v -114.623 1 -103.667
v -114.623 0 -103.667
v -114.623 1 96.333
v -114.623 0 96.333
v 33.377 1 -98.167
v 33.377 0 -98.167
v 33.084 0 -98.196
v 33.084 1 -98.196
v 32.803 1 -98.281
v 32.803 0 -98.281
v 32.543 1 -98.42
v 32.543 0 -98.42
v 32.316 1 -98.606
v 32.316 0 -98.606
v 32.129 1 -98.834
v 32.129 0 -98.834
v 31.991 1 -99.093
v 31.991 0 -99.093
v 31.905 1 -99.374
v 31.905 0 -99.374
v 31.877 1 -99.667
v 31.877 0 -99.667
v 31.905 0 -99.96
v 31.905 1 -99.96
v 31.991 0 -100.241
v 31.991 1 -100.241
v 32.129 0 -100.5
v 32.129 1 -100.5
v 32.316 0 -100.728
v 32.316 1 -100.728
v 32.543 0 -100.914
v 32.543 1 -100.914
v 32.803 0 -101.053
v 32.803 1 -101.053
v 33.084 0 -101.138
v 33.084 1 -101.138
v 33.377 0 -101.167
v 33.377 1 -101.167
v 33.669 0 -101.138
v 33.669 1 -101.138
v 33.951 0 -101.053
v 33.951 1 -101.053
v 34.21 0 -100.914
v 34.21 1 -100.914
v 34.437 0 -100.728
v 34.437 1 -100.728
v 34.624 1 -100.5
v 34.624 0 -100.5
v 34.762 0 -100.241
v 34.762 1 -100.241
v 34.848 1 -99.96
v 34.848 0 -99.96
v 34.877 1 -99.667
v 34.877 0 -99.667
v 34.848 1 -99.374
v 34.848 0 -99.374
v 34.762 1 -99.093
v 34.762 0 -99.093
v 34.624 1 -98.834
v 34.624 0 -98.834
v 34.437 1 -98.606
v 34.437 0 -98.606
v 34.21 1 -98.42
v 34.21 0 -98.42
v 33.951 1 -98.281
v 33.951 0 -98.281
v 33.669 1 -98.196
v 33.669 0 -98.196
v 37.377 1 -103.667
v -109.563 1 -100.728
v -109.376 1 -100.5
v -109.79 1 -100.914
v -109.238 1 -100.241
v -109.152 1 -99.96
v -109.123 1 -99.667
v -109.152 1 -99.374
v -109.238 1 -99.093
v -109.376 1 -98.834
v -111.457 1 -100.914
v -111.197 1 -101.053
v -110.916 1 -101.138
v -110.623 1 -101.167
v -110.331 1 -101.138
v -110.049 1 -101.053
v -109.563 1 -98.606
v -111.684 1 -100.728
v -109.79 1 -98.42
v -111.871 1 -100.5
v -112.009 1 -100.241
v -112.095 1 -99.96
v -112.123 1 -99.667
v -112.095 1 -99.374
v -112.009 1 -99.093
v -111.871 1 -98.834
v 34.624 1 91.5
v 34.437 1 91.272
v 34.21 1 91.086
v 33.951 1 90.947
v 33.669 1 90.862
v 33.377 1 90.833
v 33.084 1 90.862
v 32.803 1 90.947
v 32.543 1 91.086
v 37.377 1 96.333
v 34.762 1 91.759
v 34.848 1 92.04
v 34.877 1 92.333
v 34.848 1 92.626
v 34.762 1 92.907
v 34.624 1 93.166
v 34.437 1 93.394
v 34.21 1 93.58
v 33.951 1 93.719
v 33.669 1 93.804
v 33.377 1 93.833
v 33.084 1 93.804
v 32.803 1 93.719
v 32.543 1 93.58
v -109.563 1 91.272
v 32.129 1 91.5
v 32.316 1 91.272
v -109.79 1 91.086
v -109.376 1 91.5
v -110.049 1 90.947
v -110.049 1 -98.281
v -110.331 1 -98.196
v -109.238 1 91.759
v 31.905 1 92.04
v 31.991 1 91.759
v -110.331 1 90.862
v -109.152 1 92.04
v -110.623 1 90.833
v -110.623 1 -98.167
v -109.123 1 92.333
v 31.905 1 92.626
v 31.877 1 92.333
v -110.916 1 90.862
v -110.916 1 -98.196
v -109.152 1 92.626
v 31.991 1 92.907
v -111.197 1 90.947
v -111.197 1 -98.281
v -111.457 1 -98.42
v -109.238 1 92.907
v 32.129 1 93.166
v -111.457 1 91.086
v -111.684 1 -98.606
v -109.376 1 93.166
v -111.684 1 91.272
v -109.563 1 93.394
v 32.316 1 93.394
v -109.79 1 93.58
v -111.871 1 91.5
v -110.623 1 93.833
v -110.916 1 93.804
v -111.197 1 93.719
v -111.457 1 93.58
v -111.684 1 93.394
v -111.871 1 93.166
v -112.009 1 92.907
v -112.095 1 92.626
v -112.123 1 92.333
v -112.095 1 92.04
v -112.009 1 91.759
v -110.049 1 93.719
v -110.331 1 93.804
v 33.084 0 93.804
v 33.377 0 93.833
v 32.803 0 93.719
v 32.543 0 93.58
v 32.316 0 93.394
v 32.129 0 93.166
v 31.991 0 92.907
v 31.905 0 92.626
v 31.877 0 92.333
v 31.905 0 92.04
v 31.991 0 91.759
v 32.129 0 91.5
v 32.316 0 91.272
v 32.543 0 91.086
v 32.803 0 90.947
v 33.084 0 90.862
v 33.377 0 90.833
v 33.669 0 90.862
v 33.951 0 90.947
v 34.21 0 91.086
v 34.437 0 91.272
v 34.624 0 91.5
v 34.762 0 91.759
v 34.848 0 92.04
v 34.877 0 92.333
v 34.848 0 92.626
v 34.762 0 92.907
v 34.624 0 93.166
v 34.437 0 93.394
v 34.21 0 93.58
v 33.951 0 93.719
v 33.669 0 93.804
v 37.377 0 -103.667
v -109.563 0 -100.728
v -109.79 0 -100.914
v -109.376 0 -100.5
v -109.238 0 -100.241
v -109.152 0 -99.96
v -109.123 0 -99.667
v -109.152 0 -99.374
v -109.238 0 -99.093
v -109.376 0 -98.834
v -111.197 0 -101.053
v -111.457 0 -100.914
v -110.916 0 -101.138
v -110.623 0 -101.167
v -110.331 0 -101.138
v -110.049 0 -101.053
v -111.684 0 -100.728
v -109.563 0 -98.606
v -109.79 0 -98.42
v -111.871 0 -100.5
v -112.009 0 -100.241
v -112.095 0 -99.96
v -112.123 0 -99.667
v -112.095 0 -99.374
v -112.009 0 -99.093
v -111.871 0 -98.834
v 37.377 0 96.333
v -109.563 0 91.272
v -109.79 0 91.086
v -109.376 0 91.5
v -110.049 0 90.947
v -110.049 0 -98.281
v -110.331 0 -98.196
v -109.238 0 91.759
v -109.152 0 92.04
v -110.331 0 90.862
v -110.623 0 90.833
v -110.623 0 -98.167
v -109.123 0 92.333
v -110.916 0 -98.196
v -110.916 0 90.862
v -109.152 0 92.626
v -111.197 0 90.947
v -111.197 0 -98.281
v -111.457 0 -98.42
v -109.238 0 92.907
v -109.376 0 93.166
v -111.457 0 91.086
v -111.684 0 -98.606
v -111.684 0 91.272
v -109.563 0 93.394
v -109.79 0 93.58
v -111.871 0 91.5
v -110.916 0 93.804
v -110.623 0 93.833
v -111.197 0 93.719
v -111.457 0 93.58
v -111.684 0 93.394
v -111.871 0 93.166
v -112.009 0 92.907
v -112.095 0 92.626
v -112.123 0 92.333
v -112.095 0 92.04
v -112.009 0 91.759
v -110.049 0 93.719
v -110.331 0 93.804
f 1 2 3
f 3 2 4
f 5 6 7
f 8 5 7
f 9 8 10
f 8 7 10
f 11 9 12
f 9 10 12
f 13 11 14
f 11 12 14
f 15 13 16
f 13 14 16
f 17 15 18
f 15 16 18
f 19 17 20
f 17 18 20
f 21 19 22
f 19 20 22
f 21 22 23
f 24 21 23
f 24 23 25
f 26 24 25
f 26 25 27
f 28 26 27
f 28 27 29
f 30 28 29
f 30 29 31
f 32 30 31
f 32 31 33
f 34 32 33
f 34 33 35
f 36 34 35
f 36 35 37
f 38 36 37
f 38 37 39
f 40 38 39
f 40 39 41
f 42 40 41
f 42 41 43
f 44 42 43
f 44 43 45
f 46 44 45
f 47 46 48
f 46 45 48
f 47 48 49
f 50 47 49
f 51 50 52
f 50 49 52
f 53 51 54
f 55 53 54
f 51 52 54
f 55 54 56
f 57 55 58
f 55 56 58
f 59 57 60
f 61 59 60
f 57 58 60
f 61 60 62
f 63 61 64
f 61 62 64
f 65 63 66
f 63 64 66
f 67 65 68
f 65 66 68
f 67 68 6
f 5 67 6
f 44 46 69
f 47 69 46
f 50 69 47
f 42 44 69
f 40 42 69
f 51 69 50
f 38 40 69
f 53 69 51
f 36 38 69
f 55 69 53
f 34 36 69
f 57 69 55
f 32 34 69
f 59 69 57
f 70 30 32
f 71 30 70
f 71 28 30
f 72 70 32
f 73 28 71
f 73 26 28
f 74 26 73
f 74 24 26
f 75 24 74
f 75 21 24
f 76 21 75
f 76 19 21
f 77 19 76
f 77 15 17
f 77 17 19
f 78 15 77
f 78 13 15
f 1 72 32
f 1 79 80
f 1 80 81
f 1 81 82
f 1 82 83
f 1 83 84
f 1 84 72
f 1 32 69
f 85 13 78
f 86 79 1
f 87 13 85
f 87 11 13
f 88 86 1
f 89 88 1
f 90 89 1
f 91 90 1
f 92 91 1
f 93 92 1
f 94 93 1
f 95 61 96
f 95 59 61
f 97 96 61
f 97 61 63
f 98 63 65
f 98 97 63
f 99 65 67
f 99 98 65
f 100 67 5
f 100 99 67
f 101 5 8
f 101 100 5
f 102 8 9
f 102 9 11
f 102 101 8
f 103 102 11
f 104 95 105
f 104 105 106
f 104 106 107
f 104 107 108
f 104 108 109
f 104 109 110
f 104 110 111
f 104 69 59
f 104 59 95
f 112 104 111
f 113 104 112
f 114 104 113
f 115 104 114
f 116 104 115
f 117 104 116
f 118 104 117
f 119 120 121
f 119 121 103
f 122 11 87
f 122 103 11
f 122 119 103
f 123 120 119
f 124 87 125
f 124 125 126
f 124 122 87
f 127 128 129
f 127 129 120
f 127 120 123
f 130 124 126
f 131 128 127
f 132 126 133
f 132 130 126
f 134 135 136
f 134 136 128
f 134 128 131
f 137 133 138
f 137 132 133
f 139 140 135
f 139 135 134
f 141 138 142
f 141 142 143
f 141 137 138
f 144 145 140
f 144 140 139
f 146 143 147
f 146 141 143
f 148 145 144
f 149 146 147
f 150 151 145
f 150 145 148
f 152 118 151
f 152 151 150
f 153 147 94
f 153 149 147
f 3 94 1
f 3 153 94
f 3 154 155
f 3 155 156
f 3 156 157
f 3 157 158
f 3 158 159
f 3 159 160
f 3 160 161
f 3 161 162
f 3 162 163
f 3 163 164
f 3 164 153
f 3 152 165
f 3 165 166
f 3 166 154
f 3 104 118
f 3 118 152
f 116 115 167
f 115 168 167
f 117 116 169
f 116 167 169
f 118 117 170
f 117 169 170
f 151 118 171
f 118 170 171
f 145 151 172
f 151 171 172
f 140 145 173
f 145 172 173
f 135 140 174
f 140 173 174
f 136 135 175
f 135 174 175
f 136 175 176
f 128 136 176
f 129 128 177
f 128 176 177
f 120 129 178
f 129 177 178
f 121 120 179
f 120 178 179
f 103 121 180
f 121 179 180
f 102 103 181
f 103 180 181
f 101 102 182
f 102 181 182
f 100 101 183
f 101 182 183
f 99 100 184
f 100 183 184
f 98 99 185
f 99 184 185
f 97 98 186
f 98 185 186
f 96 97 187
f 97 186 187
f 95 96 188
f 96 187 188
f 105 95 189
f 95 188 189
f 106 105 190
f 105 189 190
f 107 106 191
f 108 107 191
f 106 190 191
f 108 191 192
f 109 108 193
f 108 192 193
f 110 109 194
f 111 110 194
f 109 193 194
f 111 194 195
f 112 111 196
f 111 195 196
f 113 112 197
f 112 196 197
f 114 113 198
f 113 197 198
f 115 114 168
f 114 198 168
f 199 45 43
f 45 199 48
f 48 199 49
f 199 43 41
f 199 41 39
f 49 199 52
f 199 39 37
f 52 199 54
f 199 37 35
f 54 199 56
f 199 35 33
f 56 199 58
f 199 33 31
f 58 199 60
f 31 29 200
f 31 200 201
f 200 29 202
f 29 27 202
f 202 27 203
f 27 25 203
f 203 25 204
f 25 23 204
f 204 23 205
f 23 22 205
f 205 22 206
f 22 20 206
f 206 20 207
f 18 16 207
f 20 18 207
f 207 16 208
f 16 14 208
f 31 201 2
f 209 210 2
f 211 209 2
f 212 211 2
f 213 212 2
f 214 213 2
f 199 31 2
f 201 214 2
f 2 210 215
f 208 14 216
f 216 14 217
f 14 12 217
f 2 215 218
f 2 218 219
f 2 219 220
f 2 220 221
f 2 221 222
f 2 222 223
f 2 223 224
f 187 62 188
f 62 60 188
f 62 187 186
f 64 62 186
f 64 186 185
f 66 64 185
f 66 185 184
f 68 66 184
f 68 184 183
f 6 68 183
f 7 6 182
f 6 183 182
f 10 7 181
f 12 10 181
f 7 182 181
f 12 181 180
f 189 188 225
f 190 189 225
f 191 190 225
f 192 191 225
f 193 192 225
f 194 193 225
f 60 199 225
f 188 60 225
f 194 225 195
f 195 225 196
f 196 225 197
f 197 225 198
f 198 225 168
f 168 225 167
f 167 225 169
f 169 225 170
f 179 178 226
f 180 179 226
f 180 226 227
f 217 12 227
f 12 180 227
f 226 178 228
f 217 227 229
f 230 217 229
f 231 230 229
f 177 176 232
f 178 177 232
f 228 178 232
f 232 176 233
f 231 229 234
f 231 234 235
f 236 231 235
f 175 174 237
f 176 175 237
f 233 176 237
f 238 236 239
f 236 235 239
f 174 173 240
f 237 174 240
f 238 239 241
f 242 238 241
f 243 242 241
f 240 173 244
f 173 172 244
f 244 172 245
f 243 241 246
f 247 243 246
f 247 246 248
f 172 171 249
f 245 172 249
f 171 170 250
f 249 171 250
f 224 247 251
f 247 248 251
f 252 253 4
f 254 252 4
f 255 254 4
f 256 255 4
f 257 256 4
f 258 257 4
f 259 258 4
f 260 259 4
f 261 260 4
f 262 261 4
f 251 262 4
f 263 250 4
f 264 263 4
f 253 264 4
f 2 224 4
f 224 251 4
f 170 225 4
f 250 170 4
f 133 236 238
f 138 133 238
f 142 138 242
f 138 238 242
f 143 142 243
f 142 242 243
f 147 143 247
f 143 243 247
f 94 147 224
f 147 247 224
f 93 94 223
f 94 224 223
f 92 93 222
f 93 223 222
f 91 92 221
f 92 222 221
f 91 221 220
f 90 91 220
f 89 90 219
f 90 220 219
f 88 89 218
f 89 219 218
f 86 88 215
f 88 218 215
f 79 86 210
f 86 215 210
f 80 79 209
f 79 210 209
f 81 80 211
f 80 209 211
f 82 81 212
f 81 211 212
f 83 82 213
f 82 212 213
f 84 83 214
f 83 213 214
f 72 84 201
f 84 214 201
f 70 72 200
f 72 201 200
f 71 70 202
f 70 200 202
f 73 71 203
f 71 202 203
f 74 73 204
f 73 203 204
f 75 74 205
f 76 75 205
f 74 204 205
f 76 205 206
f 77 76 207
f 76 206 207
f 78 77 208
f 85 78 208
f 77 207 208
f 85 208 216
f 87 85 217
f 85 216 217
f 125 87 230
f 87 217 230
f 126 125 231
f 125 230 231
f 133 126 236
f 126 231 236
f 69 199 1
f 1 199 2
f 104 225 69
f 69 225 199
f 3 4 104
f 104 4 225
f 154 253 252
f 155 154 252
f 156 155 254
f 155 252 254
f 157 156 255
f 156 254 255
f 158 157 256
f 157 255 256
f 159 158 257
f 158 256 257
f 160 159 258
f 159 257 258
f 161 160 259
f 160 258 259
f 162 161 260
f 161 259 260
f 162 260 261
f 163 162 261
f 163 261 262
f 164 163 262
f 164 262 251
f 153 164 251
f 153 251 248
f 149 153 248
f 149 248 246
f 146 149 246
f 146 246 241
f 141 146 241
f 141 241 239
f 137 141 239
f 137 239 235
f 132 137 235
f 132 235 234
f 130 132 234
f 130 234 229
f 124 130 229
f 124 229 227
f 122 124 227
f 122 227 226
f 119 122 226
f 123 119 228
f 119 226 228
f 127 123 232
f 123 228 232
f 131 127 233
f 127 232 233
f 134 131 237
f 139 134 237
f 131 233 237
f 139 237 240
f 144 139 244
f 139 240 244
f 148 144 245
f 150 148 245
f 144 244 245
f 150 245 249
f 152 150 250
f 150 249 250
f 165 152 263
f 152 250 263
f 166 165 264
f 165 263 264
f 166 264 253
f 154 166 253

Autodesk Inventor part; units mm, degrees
ref_plane "YZ Plane" through (0, 0, 0) normal (1, 0, 0) x (0, 1, 0)
ref_plane "XZ Plane" through (0, 0, 0) normal (0, 1, 0) x (-1, 0, 0)
ref_plane "XY Plane" through (0, 0, 0) normal (0, 0, 1) x (1, 0, 0)
sketch "Sketch1" plane through (0, 0, 0) normal (0, 1, 0) x (-1, 0, 0)
  line L0 (114.6234, 96.3329) -> (-37.3766, 96.3329)
  line L1 (-37.3766, 96.3329) -> (-37.3766, -103.6671)
  line L2 (-37.3766, -103.6671) -> (114.6234, -103.6671)
  line L3 (114.6234, -103.6671) -> (114.6234, 96.3329)
  point P0 (0, 0)
  dimension "d0" = 200
  dimension "d1" = 152
extrude "Extrusion1" add sketch "Sketch1" along normal blind 1
sketch "Sketch2" plane through (0, 1, 0) normal (0, 1, 0) x (1, 0, 0)
  line L0 (-114.6234, 103.6671) -> (-114.6234, -96.3329) projected
  line L1 (37.3766, -96.3329) -> (37.3766, 103.6671) projected
  line L2 (-114.6234, -96.3329) -> (37.3766, -96.3329) projected
  line L3 (37.3766, 103.6671) -> (-114.6234, 103.6671) projected
  point P0 (0, 0)
  point P1 (-110.6234, -92.3329)
  point P2 (33.3766, -92.3329)
  point P3 (33.3766, 99.6671)
  point P4 (-110.6234, 99.6671)
  dimension "d4" = 0
  dimension "d5" = 0
  dimension "d6" = 0
  dimension "d7" = 0
  dimension "d8" = 4
  dimension "d9" = 4
  dimension "d10" = 4
  dimension "d11" = 4
hole "Hole1" at (-110.6234, 1, 92.3329) at (33.3766, 1, 92.3329) at (33.3766, 1, -99.6671) at (-110.6234, 1, -99.6671) direction (0, -1, 0) diameter 3 depth 25.4 tip angle 118.188
equation "\"d0\" = BoardLength"
equation "\"d1\" = 3 * BoardWidth + 2 * BoardGap"
equation "\"d2\" = BoardHeight"
equation "\"d8\" = ScrewHoleOffset"
equation "\"d9\" = ScrewHoleOffset"
equation "\"d10\" = ScrewHoleOffset"
equation "\"d11\" = ScrewHoleOffset"
equation "\"d12\" = ScrewSize"
equation "\"BoardLength\" = 200"
equation "\"BoardWidth\" = 48"
equation "\"ScrewSize\" = 3"
equation "\"ScrewHoleOffset\" = 4"
equation "\"BoardGap\" = 4"
equation "\"BoardHeight\" = 1"
equation "\"BaseLength\" = 648"
equation "\"BaseWidth\" = 556"
equation "\"VertOffsetBetweenScrews\" = 192"
properties part number "PRT1001-212 3U Board"
